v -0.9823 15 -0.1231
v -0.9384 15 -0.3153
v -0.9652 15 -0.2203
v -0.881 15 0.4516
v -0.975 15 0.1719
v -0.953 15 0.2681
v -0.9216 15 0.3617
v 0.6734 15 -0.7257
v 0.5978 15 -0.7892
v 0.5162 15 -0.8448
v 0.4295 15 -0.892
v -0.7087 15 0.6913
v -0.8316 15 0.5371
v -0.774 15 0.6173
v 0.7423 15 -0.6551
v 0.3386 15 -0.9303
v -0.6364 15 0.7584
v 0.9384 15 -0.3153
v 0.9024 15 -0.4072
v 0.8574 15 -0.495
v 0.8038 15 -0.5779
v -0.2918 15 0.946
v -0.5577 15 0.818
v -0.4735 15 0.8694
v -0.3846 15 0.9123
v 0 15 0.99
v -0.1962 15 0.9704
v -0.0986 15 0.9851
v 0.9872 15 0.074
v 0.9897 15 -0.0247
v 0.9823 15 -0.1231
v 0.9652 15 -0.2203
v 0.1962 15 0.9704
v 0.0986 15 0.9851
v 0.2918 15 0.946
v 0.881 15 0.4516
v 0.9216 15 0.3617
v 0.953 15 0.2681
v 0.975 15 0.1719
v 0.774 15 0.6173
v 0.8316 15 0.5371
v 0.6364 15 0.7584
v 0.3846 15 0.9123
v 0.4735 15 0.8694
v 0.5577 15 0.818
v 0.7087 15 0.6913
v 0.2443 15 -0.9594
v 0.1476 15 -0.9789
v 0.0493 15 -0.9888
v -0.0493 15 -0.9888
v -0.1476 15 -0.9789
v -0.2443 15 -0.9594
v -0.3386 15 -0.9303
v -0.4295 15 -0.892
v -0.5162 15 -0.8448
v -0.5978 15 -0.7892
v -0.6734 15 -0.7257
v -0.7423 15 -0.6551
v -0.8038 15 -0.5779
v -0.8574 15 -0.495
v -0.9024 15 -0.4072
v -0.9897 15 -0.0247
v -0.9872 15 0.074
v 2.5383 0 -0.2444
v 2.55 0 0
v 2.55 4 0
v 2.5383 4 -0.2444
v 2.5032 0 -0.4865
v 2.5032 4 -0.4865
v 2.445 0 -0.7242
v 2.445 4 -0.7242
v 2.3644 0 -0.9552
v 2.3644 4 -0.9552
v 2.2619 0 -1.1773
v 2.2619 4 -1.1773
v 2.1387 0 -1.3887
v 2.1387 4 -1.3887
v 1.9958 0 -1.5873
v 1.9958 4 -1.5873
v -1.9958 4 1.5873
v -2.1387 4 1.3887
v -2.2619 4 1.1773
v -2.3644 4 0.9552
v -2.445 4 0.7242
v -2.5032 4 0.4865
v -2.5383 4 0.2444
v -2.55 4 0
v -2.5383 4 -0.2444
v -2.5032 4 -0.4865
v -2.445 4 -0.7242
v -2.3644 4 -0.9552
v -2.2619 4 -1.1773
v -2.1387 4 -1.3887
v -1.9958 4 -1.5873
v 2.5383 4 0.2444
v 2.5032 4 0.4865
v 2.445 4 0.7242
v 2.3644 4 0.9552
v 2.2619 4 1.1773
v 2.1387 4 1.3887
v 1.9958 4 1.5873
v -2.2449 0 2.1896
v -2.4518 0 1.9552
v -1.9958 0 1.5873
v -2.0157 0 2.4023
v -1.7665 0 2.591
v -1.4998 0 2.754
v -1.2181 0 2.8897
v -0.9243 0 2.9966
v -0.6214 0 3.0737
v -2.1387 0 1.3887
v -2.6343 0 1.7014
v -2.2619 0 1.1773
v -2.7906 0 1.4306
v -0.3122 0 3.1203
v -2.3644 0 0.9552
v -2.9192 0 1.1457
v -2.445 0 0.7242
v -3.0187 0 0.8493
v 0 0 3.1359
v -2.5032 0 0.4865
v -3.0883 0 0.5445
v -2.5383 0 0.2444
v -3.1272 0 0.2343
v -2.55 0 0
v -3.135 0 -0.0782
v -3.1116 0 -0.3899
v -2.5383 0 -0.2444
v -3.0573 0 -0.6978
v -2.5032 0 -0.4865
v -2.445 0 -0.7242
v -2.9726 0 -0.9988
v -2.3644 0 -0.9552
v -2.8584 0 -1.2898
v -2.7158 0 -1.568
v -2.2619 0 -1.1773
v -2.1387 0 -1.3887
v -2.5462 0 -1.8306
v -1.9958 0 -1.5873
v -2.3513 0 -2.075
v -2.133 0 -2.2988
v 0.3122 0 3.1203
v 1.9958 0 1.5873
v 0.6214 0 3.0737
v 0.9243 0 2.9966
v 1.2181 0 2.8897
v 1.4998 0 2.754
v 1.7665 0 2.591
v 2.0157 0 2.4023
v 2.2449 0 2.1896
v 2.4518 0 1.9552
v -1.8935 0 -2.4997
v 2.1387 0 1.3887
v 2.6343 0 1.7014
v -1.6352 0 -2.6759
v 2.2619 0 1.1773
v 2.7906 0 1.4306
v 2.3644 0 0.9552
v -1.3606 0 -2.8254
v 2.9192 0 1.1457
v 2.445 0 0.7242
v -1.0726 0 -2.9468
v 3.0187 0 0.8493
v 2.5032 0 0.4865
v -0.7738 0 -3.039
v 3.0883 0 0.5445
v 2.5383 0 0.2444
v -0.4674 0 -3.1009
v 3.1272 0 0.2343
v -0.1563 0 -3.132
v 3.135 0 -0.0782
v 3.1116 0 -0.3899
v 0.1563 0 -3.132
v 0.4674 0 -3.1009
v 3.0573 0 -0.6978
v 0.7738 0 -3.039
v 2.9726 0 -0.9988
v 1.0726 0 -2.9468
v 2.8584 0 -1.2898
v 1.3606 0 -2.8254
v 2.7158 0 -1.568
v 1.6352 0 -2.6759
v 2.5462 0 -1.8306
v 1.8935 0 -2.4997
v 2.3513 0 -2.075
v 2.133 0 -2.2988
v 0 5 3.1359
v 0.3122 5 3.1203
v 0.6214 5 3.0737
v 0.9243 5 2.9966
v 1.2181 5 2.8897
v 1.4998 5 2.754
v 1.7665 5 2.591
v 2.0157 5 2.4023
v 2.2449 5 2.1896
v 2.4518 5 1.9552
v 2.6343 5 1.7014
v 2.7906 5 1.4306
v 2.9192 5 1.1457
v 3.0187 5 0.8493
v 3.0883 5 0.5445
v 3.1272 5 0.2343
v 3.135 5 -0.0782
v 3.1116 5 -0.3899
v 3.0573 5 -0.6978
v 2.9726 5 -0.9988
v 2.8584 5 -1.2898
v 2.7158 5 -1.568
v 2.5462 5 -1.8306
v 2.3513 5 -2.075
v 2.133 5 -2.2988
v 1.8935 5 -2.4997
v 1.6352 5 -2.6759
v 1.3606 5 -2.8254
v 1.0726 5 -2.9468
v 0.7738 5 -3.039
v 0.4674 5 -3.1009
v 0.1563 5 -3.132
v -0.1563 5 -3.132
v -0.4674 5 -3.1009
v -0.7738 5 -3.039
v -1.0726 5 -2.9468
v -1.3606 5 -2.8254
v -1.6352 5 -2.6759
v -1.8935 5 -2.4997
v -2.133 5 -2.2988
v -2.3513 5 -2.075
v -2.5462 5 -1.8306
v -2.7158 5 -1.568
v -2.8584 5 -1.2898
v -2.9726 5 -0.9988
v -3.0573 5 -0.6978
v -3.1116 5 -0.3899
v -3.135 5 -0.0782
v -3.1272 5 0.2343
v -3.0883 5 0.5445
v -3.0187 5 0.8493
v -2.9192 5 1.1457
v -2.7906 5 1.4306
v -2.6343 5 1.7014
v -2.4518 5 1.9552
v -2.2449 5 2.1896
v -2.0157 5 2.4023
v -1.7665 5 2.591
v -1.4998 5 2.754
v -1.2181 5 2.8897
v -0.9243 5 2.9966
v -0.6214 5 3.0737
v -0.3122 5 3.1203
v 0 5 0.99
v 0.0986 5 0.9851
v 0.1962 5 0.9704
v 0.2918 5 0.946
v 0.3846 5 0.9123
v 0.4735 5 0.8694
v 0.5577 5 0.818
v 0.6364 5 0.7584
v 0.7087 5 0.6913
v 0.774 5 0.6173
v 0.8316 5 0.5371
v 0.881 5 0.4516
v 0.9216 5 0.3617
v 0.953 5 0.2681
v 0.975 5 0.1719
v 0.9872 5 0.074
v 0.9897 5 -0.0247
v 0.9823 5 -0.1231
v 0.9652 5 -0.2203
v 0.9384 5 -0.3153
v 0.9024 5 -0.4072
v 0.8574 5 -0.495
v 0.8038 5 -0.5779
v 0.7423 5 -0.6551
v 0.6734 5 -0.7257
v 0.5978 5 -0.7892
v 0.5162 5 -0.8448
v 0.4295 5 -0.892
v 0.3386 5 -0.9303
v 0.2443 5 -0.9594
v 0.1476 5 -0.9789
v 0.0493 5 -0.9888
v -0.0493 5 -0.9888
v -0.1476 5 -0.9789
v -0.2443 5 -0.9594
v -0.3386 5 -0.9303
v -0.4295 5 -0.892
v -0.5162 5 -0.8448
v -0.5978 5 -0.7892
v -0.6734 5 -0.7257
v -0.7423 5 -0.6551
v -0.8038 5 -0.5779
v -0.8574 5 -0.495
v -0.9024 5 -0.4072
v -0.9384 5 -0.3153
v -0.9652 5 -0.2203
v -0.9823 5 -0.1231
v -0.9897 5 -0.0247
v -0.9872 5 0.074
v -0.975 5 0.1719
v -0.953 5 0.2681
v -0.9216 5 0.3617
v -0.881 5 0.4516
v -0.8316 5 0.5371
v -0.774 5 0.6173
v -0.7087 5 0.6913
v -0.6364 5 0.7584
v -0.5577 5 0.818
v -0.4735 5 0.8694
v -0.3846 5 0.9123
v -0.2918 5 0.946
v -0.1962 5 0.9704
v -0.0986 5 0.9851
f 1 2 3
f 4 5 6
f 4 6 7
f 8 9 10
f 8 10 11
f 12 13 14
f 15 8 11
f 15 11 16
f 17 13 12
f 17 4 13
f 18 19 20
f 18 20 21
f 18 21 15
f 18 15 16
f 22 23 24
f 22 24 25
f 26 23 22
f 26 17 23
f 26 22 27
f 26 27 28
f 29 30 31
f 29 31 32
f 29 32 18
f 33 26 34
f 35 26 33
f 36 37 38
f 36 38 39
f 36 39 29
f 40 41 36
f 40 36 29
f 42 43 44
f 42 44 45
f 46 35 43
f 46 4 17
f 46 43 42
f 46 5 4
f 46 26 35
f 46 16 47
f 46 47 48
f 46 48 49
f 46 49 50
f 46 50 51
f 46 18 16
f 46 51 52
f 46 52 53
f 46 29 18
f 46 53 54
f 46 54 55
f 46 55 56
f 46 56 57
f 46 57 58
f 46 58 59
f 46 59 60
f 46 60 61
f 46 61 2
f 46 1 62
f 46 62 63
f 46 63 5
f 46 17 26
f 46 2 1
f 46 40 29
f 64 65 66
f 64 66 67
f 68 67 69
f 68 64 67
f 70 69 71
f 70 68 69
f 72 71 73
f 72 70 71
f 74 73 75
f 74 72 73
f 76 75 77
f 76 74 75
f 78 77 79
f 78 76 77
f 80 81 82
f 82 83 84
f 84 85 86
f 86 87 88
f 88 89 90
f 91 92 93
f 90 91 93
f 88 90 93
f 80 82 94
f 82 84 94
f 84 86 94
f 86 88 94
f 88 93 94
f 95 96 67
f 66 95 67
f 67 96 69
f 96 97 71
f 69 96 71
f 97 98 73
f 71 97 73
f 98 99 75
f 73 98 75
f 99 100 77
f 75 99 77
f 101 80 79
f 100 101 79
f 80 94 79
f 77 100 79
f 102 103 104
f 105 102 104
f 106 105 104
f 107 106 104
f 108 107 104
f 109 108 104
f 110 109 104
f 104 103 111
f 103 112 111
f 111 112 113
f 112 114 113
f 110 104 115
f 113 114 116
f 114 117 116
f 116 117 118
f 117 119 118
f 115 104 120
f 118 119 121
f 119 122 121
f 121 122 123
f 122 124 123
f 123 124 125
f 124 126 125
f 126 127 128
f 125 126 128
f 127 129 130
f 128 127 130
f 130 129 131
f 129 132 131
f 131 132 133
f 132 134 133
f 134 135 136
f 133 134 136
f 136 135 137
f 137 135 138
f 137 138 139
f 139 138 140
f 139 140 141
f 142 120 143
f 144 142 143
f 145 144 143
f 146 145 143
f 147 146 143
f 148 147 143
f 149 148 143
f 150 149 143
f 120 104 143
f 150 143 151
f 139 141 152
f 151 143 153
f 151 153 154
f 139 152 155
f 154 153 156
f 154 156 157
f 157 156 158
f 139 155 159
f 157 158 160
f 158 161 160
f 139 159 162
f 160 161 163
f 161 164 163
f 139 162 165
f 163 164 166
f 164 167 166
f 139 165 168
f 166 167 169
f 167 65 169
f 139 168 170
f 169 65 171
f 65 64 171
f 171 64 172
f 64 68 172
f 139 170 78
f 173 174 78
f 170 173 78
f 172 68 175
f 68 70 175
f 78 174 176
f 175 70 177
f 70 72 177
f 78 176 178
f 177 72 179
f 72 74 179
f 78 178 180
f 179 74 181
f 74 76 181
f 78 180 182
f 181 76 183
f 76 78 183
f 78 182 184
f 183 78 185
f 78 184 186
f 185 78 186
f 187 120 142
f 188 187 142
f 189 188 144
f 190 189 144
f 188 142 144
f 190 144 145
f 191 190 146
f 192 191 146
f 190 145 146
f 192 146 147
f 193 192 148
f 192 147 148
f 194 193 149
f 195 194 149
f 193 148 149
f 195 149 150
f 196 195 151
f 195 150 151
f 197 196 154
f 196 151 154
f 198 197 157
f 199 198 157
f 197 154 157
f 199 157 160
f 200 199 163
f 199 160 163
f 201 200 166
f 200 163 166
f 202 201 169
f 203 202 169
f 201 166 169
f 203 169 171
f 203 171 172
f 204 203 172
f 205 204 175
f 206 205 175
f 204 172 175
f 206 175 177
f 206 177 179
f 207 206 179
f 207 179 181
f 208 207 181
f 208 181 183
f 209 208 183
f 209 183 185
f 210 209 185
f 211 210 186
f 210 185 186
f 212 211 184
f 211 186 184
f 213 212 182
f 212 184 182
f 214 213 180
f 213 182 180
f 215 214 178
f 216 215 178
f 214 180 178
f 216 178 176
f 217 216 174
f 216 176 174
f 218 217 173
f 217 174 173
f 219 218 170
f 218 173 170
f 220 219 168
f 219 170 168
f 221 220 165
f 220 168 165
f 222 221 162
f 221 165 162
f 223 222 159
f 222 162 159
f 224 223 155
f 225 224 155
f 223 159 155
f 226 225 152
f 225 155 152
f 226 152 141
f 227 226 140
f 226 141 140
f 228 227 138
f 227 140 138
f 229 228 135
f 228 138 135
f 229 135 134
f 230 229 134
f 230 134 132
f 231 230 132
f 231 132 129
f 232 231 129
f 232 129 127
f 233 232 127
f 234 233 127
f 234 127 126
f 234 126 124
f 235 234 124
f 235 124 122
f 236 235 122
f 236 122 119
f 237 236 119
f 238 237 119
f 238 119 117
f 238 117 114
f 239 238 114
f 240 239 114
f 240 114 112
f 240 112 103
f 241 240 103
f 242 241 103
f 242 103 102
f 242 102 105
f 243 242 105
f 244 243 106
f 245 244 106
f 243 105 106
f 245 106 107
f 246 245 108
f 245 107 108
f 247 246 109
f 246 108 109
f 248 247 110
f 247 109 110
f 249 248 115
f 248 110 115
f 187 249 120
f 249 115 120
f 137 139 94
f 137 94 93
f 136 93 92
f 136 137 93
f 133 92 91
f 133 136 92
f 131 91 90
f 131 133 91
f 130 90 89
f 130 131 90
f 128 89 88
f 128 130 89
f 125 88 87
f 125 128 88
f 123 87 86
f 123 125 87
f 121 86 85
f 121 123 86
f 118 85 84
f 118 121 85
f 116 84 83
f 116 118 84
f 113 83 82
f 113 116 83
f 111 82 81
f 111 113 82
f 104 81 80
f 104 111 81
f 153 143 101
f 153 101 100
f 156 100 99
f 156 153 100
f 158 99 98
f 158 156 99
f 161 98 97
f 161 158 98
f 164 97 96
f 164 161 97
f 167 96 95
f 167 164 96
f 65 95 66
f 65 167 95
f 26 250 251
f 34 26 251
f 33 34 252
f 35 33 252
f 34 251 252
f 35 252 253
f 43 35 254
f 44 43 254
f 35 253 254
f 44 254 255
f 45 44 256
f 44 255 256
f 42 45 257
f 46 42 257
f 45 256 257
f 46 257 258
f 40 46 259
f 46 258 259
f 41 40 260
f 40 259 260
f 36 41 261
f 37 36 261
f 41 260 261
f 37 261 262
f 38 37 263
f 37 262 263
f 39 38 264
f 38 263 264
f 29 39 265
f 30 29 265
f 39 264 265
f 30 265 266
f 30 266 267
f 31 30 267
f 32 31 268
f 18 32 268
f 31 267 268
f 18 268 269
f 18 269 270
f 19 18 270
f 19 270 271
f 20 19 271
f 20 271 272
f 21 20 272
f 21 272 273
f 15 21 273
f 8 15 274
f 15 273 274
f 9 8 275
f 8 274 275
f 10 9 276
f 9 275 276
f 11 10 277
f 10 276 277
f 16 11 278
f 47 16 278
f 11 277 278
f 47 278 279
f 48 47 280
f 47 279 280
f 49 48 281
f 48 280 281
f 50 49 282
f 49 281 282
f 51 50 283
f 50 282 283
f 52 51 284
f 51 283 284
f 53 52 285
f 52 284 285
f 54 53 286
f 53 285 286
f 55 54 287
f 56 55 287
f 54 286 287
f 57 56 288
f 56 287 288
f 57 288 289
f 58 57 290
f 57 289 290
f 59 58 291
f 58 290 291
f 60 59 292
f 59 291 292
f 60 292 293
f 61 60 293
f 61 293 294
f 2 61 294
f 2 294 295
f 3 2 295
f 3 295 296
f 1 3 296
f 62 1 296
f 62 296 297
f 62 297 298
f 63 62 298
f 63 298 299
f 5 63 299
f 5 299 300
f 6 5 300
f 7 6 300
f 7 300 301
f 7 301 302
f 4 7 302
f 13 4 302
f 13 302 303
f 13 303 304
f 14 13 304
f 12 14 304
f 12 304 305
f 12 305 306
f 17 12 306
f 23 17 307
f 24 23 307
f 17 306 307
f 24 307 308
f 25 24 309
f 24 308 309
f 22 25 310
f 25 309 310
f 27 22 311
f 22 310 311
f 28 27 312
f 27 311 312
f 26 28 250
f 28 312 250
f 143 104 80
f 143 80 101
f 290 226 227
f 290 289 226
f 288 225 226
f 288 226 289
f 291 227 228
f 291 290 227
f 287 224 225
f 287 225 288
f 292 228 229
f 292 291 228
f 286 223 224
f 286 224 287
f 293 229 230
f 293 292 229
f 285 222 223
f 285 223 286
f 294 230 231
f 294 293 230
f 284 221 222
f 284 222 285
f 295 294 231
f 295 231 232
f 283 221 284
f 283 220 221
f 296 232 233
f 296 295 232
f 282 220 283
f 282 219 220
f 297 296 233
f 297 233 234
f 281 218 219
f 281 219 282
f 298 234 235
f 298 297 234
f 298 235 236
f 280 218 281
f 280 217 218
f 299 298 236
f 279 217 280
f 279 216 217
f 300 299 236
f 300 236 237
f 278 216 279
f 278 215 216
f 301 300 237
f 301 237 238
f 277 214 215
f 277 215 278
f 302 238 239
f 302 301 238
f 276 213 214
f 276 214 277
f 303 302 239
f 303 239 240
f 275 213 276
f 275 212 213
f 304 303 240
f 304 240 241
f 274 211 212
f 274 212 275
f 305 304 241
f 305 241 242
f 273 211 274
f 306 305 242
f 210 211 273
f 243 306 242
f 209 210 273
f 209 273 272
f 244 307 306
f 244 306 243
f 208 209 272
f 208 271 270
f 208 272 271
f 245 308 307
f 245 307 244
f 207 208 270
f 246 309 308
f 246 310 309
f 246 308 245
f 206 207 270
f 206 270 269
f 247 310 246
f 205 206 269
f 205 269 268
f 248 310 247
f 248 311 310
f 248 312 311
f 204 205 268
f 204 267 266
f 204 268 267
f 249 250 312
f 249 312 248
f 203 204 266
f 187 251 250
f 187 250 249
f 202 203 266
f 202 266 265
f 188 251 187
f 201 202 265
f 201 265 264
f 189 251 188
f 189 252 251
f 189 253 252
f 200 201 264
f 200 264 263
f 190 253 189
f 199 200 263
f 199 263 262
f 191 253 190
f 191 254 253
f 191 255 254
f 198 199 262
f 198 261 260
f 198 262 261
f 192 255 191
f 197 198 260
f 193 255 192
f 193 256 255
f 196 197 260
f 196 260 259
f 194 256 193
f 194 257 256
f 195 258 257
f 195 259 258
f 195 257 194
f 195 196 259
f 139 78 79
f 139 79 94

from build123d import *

# Parameters (mm, degrees)
SKETCH1_R           = 3.135927073
SKETCH1_R_2         = 2.01
BOSS_EXTRUDE1_DEPTH = 5
CUT_EXTRUDE4_DEPTH  = 4
SKETCH4_R           = 0.99
BOSS_EXTRUDE3_DEPTH = 10


with BuildPart() as part:
    # Sketch1 → Boss-Extrude1 (new body)
    # profile 1 of 4: a face of its own
    with BuildSketch(Plane(origin=(0, 0, 0), x_dir=(1, 0, 0), z_dir=(0, 1, 0))):
        with Locations(Location((0, 0, 0), (0, 0, 270))):
            Circle(SKETCH1_R)
        Circle(SKETCH1_R_2, mode=Mode.SUBTRACT)
    # profile 2 of 4: a face of its own
    with BuildSketch(Plane(origin=(0, 0, 0), x_dir=(1, 0, 0), z_dir=(0, 1, 0))):
        with BuildLine():
            Line((1.48610851, 1.353359337), (-1.48610851, 1.353359337))
            ThreePointArc((-1.48610851, 1.353359337), (-2.009995593, 0.004208893), (-1.491763272, -1.347123729))
            Line((-1.491763272, -1.347123729), (1.491763272, -1.347123729))
            ThreePointArc((1.491763272, -1.347123729), (1.875972305, -0.721684081), (2.01, 0))
            ThreePointArc((2.01, 0), (1.874457002, 0.725610741), (1.48610851, 1.353359337))
        make_face()
    # profile 3 of 4: a face of its own
    with BuildSketch(Plane(origin=(0, 0, 0), x_dir=(1, 0, 0), z_dir=(0, 1, 0))):
        with BuildLine():
            ThreePointArc((1.48610851, 1.353359337), (0, 2.01), (-1.48610851, 1.353359337))
            Line((-1.48610851, 1.353359337), (1.48610851, 1.353359337))
        make_face()
    # profile 4 of 4: a face of its own
    with BuildSketch(Plane(origin=(0, 0, 0), x_dir=(1, 0, 0), z_dir=(0, 1, 0))):
        with BuildLine():
            Line((1.491763272, -1.347123729), (-1.491763272, -1.347123729))
            ThreePointArc((-1.491763272, -1.347123729), (0, -2.01), (1.491763272, -1.347123729))
        make_face()
    extrude(amount=BOSS_EXTRUDE1_DEPTH)

    # Sketch2 → Cut-Extrude4 (cut)
    with BuildSketch(Plane(origin=(0, 0, 0), x_dir=(1, 0, 0), z_dir=(0, 1, 0))):
        with BuildLine():
            Line((-1.995763722, -1.58727035), (1.995763722, -1.58727035))
            ThreePointArc((1.995763722, -1.58727035), (2.407456904, -0.840625514), (2.55, 0))
            ThreePointArc((2.55, 0), (2.407456904, 0.840625514), (1.995763722, 1.58727035))
            Line((1.995763722, 1.58727035), (-1.995763722, 1.58727035))
            ThreePointArc((-1.995763722, 1.58727035), (-2.55, 0), (-1.995763722, -1.58727035))
        make_face()
    extrude(amount=CUT_EXTRUDE4_DEPTH, mode=Mode.SUBTRACT)

    # Sketch4 → Boss-Extrude3 (add)
    with BuildSketch(Plane(origin=(0, 5, 0), x_dir=(1, 0, 0), z_dir=(0, 1, 0))):
        with Locations(Location((0, 0, 0), (0, 0, 270))):
            Circle(SKETCH4_R)
    extrude(amount=BOSS_EXTRUDE3_DEPTH)


solid = part.part
